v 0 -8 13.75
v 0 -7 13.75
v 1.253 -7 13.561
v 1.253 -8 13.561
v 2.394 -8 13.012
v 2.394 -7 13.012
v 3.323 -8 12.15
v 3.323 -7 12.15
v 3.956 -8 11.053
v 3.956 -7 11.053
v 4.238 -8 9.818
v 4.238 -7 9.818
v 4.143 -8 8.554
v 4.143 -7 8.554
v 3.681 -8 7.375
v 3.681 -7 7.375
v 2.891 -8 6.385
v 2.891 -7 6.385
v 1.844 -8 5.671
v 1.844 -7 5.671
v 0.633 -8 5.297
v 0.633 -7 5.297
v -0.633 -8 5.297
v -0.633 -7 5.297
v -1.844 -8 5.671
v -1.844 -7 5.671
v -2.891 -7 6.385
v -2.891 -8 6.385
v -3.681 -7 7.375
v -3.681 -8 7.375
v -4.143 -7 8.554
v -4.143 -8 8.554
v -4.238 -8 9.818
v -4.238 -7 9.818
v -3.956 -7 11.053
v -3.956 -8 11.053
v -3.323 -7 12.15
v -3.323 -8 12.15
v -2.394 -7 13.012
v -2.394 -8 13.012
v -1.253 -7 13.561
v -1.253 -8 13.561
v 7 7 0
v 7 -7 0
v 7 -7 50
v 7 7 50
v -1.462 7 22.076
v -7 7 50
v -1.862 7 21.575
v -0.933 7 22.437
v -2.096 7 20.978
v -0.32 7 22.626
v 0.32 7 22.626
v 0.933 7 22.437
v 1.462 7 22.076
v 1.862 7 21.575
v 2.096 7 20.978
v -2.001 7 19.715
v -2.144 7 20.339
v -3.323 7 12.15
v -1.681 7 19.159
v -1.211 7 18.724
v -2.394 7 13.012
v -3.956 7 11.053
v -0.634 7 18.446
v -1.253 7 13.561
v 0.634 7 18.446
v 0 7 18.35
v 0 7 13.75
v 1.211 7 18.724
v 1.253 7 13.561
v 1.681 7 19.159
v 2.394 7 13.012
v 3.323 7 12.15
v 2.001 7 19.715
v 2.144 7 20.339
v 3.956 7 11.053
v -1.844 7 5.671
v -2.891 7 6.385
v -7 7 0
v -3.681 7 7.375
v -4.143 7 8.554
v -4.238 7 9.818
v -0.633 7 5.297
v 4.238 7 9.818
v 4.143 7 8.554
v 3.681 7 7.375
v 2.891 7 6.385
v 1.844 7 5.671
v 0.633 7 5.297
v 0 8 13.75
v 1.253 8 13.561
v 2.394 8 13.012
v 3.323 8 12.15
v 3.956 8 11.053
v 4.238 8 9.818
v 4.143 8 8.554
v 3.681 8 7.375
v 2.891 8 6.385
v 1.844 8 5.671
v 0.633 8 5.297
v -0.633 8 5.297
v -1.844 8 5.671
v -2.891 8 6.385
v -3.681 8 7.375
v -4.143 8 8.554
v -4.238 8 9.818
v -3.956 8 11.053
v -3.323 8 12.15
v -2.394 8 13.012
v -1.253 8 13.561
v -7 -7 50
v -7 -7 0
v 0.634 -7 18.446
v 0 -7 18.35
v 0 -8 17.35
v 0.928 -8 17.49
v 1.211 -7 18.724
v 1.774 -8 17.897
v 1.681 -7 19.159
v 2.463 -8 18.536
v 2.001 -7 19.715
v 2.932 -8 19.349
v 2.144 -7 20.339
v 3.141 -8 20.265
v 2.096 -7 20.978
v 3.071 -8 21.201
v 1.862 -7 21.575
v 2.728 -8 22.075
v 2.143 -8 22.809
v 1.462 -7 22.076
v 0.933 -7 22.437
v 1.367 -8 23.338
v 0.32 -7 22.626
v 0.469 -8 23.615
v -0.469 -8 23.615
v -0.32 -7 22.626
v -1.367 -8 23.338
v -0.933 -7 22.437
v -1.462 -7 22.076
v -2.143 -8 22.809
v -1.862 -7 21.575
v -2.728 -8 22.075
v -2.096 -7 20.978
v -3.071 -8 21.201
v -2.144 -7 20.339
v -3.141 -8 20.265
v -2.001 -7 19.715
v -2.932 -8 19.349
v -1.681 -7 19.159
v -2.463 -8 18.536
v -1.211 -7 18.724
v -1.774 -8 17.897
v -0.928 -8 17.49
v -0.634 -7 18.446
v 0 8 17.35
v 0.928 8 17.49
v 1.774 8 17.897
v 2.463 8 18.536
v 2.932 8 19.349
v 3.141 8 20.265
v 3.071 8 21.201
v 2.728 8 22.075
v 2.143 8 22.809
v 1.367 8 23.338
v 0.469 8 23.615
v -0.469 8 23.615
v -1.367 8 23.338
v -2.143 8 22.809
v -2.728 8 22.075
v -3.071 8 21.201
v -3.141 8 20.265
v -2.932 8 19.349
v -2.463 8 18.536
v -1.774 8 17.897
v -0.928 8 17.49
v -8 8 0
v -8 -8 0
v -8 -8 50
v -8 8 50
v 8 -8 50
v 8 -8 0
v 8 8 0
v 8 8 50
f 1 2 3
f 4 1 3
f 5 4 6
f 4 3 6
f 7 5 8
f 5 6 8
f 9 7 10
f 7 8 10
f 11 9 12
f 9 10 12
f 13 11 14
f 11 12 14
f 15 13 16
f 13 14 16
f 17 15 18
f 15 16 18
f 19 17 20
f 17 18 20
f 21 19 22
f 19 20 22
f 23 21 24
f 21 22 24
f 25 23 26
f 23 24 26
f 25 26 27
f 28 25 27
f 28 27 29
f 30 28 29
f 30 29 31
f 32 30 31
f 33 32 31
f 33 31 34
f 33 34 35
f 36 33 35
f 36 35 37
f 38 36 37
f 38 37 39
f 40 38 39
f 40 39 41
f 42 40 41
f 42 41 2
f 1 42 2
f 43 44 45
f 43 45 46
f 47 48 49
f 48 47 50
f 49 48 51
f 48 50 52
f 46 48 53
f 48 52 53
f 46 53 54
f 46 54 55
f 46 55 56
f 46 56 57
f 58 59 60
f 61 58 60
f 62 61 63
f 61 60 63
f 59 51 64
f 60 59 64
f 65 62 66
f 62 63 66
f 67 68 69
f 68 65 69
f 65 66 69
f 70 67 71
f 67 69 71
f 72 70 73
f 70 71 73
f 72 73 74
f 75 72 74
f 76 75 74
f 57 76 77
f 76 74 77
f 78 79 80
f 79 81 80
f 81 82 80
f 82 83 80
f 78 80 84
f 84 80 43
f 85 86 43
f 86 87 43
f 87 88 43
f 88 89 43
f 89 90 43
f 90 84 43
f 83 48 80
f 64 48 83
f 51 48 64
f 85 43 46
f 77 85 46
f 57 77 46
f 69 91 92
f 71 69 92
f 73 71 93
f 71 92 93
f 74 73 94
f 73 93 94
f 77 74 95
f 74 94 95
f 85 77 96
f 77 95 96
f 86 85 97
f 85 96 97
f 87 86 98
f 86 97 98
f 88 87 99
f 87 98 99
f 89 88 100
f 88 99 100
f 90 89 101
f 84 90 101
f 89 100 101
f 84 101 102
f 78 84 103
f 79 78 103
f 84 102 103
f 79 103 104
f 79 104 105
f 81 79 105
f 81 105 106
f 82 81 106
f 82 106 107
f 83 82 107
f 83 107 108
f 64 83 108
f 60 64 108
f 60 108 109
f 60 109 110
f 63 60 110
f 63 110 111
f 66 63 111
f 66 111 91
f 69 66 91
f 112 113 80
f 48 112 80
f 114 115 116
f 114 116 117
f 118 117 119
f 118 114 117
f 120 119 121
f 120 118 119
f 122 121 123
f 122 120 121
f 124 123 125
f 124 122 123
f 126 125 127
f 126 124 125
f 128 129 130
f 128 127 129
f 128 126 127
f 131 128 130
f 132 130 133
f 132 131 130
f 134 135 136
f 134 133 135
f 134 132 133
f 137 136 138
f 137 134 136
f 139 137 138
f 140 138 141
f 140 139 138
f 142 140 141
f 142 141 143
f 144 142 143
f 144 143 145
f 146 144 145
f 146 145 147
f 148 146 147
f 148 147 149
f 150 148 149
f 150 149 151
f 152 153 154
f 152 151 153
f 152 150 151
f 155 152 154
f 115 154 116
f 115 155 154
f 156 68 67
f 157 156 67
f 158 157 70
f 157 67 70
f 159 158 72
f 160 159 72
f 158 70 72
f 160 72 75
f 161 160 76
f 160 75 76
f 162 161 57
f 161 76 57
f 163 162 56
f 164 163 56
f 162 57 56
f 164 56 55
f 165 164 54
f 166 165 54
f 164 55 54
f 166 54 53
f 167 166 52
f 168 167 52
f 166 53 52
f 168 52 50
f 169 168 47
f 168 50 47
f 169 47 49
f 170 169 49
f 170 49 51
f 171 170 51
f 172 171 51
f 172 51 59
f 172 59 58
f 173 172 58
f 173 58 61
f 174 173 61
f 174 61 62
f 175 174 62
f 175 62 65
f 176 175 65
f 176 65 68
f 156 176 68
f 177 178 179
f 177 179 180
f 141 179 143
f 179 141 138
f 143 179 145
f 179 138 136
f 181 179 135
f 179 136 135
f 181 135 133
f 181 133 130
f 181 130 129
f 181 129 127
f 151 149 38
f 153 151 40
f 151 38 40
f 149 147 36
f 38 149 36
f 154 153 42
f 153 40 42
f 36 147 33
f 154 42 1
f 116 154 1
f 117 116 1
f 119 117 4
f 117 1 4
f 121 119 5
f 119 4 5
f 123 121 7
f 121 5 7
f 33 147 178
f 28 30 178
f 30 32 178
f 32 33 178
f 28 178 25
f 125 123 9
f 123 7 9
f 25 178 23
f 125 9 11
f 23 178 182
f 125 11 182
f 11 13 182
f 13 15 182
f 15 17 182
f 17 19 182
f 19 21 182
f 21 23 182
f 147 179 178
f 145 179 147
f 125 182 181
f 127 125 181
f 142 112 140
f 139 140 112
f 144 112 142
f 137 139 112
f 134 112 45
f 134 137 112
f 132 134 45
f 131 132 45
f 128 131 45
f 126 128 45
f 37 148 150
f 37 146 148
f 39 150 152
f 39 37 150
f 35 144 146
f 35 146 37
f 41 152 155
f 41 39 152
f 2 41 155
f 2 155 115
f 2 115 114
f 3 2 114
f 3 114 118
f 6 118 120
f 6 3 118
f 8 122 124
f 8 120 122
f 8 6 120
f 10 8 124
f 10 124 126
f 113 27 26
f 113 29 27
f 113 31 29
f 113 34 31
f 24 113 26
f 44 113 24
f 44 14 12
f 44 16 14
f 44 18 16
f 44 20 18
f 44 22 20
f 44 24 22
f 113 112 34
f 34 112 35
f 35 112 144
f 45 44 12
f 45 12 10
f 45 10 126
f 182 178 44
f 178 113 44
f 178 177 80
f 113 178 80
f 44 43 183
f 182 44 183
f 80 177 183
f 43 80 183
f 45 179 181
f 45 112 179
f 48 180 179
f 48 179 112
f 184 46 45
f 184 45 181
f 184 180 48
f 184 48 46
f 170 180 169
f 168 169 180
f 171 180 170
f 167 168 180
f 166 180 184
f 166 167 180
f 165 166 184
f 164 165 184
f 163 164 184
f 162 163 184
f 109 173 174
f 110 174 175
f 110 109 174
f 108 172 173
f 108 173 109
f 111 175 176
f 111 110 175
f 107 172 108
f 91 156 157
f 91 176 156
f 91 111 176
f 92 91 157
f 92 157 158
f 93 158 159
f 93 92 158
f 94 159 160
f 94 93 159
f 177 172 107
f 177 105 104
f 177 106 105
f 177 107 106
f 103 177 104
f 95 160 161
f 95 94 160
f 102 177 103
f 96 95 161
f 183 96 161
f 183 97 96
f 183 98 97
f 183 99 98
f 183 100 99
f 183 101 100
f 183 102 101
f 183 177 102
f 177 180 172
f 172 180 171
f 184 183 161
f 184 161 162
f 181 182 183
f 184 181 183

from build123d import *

# Parameters (mm, degrees)
SKETCH1_W                                       = 16
SKETCH1_H                                       = 16
SKETCH1_W_2                                     = 14
SKETCH1_H_2                                     = 14
BOSS_EXTRUDE1_DEPTH                             = 50
SKETCH2_R                                       = 4.25
CUT_EXTRUDE1_DEPTH                              = 54.103672189
CSK_FOR_M3_FLAT_HEAD_MACHINE_SCREW1_D           = 3.4
CSK_FOR_M3_FLAT_HEAD_MACHINE_SCREW1_CSINK_D     = 6.3
CSK_FOR_M3_FLAT_HEAD_MACHINE_SCREW1_CSINK_ANGLE = 90


with BuildPart() as part:
    # Sketch1 → Boss-Extrude1 (new body)
    with BuildSketch(Plane.XY):
        Rectangle(SKETCH1_W, SKETCH1_H)
        Rectangle(SKETCH1_W_2, SKETCH1_H_2, mode=Mode.SUBTRACT)
    extrude(amount=BOSS_EXTRUDE1_DEPTH)

    # Sketch2 → Cut-Extrude1 (cut, through all)
    with BuildSketch(Plane(origin=(0, 8, 0), x_dir=(1, 0, 0), z_dir=(0, 1, 0))):
        with Locations((0, -9.5)):
            Circle(SKETCH2_R)
    extrude(amount=-CUT_EXTRUDE1_DEPTH, mode=Mode.SUBTRACT)

    # CSK for M3 Flat Head Machine Screw1 (through all)
    with Locations(Plane(origin=(0, 8, 20.5), x_dir=(0, 0, 1), z_dir=(0, 1, 0))):
        with Locations((0, 0)):
            csk_for_m3_flat_head_machine_screw1 = CounterSinkHole(CSK_FOR_M3_FLAT_HEAD_MACHINE_SCREW1_D / 2, CSK_FOR_M3_FLAT_HEAD_MACHINE_SCREW1_CSINK_D / 2, counter_sink_angle=CSK_FOR_M3_FLAT_HEAD_MACHINE_SCREW1_CSINK_ANGLE)

    # Mirror1: CSK for M3 Flat Head Machine Screw1 across plane
    add(csk_for_m3_flat_head_machine_screw1.mirror(Plane.ZX), mode=Mode.SUBTRACT)


solid = part.part
